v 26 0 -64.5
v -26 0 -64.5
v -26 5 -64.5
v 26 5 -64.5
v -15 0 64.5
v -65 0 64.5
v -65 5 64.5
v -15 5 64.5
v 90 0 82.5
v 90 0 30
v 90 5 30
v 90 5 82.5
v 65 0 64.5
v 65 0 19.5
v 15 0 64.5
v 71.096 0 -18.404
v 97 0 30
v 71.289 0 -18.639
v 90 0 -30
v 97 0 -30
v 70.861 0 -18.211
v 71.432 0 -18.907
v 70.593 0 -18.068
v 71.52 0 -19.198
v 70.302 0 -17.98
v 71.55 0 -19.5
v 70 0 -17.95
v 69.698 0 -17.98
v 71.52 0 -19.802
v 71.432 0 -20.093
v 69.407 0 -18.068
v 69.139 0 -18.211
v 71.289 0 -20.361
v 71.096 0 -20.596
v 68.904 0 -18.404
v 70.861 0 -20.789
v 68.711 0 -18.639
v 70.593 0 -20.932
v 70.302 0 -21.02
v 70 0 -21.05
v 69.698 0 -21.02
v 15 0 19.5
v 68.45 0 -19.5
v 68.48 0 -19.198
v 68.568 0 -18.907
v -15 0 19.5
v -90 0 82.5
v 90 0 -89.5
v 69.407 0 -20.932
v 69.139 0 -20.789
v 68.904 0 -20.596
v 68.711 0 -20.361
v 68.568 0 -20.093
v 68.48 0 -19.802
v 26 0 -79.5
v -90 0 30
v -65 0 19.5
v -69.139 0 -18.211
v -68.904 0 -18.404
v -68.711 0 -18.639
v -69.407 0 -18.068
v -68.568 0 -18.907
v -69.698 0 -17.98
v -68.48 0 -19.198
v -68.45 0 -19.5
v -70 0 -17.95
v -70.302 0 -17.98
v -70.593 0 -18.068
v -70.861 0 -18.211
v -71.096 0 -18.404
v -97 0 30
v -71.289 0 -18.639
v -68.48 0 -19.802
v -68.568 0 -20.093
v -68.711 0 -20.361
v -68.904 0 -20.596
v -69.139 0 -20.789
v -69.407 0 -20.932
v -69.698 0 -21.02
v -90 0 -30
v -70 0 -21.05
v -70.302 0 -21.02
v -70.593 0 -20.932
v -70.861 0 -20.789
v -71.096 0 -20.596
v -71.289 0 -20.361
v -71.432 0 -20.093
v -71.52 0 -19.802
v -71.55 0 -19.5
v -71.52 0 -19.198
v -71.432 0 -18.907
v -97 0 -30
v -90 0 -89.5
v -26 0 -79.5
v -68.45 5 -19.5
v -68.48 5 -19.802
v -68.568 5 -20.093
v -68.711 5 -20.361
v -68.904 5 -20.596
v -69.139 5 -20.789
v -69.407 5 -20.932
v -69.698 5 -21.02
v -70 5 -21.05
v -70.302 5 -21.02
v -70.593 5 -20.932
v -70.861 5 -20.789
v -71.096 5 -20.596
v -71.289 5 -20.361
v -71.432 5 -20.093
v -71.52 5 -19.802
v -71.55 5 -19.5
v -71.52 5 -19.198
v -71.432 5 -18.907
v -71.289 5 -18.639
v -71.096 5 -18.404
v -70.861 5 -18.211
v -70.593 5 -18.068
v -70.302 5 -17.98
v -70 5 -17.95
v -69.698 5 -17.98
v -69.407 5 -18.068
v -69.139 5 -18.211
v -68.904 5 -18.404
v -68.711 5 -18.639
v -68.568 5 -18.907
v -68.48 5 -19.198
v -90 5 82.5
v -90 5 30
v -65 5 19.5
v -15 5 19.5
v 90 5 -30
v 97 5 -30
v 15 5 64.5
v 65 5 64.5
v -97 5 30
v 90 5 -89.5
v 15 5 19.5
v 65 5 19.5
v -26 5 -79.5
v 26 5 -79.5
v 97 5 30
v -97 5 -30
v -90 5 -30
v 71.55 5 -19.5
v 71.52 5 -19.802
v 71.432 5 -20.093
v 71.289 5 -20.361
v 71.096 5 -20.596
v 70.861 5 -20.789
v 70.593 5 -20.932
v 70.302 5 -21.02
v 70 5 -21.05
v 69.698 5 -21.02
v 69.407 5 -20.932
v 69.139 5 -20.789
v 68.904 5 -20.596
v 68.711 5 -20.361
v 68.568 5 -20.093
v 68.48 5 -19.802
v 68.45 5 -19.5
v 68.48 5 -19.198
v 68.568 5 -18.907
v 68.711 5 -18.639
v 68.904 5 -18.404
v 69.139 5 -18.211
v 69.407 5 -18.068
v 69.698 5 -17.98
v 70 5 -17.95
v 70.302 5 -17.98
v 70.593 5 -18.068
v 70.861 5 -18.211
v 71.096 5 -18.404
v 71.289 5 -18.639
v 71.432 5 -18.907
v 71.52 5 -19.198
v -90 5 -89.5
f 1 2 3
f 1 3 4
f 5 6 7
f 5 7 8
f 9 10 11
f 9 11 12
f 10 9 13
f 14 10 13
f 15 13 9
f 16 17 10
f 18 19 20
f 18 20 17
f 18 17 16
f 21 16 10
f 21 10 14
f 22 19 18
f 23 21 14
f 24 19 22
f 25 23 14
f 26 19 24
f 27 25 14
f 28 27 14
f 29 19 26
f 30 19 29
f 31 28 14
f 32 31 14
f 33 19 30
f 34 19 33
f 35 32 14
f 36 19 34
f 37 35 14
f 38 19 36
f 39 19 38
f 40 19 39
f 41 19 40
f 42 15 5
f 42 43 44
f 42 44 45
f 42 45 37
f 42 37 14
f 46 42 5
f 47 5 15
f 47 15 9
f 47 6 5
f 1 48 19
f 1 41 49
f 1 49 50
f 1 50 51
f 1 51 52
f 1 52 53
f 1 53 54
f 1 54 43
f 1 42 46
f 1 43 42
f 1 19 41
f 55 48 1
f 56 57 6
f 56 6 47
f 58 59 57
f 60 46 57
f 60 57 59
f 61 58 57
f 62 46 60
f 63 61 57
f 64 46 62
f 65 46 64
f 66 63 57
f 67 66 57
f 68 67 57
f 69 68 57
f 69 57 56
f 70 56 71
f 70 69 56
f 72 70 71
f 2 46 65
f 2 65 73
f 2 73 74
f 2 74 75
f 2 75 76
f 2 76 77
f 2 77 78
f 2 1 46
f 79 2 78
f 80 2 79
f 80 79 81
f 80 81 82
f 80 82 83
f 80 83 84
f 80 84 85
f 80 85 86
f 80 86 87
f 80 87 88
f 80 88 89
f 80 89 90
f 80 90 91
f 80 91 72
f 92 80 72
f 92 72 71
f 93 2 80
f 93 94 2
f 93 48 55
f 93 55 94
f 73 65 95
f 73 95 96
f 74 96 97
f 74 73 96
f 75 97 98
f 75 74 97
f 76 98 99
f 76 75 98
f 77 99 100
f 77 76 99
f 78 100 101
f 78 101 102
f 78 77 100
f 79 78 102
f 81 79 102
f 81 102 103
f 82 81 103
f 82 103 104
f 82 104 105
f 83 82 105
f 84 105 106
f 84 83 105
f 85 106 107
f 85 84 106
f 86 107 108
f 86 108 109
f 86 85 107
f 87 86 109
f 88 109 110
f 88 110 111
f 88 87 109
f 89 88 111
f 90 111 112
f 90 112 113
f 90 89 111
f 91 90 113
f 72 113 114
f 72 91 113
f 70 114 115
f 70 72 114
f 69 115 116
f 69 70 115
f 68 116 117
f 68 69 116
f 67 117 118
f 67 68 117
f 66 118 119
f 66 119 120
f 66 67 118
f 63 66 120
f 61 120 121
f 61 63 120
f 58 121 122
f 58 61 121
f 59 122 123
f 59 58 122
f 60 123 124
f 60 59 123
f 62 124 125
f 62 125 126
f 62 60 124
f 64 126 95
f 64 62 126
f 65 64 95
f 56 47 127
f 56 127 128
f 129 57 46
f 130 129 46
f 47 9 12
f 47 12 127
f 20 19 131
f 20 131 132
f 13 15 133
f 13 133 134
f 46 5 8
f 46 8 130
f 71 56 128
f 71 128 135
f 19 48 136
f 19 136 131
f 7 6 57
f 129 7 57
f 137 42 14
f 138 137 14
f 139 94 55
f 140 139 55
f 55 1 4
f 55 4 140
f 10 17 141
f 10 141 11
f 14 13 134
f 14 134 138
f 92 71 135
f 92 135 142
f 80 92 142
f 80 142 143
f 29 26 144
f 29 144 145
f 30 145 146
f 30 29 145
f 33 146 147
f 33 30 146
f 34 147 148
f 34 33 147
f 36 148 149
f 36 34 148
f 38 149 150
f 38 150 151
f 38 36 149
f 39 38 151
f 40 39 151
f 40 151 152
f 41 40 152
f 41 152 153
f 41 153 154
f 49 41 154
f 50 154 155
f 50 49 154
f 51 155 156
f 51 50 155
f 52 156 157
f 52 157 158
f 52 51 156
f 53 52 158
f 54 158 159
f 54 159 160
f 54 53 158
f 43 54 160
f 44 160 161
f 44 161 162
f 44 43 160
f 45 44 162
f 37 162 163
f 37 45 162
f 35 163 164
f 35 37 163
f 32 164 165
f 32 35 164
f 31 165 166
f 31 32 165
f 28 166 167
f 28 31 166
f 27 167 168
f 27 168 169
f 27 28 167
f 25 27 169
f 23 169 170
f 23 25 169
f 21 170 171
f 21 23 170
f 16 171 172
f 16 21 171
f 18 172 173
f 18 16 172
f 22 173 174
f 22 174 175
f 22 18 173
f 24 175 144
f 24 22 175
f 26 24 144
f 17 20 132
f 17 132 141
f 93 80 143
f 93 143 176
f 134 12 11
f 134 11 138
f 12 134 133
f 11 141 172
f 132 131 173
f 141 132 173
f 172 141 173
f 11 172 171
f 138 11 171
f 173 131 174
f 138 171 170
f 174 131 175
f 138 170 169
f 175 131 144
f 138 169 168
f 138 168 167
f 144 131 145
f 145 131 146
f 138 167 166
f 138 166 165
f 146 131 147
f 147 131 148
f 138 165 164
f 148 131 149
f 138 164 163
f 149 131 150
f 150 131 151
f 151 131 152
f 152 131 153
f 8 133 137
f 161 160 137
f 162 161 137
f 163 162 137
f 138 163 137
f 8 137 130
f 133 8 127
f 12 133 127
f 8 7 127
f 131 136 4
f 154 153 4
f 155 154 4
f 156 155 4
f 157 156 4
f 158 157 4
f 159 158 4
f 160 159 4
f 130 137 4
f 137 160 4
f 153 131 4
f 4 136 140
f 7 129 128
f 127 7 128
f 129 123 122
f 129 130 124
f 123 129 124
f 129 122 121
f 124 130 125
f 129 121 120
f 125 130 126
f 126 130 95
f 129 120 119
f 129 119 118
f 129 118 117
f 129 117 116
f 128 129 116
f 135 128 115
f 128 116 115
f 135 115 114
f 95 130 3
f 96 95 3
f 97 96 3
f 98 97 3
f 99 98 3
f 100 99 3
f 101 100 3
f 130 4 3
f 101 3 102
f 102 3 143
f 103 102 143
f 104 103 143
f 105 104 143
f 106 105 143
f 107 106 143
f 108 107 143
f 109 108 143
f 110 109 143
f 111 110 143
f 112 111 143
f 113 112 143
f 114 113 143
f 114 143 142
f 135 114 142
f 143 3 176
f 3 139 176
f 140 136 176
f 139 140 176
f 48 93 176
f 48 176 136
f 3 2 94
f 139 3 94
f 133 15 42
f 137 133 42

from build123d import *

# Parameters (mm, degrees)
SKETCH1_R           = 1.55
SKETCH1_W           = 52
SKETCH1_H           = 15
SKETCH1_W_2         = 50
SKETCH1_H_2         = 45
BOSS_EXTRUDE1_DEPTH = 5


with BuildPart() as part:
    # Sketch1 → Boss-Extrude1 (new body)
    with BuildSketch(Plane(origin=(0, 0, 0), x_dir=(1, 0, 0), z_dir=(0, 1, 0))):
        Polygon((90, 30), (97, 30), (97, -30), (90, -30), (90, -82.5), (-90, -82.5), (-90, -30), (-97, -30), (-97, 30), (-90, 30), (-90, 89.5), (90, 89.5), align=None)
        with Locations((70, 19.5)):
            Circle(SKETCH1_R, mode=Mode.SUBTRACT)
        with Locations((-70, 19.5)):
            Circle(SKETCH1_R, mode=Mode.SUBTRACT)
        with Locations((0, 72)):
            Rectangle(SKETCH1_W, SKETCH1_H, mode=Mode.SUBTRACT)
        with Locations((-40, -42)):
            Rectangle(SKETCH1_W_2, SKETCH1_H_2, mode=Mode.SUBTRACT)
        with Locations((40, -42)):
            Rectangle(SKETCH1_W_2, SKETCH1_H_2, mode=Mode.SUBTRACT)
    extrude(amount=BOSS_EXTRUDE1_DEPTH)


solid = part.part
